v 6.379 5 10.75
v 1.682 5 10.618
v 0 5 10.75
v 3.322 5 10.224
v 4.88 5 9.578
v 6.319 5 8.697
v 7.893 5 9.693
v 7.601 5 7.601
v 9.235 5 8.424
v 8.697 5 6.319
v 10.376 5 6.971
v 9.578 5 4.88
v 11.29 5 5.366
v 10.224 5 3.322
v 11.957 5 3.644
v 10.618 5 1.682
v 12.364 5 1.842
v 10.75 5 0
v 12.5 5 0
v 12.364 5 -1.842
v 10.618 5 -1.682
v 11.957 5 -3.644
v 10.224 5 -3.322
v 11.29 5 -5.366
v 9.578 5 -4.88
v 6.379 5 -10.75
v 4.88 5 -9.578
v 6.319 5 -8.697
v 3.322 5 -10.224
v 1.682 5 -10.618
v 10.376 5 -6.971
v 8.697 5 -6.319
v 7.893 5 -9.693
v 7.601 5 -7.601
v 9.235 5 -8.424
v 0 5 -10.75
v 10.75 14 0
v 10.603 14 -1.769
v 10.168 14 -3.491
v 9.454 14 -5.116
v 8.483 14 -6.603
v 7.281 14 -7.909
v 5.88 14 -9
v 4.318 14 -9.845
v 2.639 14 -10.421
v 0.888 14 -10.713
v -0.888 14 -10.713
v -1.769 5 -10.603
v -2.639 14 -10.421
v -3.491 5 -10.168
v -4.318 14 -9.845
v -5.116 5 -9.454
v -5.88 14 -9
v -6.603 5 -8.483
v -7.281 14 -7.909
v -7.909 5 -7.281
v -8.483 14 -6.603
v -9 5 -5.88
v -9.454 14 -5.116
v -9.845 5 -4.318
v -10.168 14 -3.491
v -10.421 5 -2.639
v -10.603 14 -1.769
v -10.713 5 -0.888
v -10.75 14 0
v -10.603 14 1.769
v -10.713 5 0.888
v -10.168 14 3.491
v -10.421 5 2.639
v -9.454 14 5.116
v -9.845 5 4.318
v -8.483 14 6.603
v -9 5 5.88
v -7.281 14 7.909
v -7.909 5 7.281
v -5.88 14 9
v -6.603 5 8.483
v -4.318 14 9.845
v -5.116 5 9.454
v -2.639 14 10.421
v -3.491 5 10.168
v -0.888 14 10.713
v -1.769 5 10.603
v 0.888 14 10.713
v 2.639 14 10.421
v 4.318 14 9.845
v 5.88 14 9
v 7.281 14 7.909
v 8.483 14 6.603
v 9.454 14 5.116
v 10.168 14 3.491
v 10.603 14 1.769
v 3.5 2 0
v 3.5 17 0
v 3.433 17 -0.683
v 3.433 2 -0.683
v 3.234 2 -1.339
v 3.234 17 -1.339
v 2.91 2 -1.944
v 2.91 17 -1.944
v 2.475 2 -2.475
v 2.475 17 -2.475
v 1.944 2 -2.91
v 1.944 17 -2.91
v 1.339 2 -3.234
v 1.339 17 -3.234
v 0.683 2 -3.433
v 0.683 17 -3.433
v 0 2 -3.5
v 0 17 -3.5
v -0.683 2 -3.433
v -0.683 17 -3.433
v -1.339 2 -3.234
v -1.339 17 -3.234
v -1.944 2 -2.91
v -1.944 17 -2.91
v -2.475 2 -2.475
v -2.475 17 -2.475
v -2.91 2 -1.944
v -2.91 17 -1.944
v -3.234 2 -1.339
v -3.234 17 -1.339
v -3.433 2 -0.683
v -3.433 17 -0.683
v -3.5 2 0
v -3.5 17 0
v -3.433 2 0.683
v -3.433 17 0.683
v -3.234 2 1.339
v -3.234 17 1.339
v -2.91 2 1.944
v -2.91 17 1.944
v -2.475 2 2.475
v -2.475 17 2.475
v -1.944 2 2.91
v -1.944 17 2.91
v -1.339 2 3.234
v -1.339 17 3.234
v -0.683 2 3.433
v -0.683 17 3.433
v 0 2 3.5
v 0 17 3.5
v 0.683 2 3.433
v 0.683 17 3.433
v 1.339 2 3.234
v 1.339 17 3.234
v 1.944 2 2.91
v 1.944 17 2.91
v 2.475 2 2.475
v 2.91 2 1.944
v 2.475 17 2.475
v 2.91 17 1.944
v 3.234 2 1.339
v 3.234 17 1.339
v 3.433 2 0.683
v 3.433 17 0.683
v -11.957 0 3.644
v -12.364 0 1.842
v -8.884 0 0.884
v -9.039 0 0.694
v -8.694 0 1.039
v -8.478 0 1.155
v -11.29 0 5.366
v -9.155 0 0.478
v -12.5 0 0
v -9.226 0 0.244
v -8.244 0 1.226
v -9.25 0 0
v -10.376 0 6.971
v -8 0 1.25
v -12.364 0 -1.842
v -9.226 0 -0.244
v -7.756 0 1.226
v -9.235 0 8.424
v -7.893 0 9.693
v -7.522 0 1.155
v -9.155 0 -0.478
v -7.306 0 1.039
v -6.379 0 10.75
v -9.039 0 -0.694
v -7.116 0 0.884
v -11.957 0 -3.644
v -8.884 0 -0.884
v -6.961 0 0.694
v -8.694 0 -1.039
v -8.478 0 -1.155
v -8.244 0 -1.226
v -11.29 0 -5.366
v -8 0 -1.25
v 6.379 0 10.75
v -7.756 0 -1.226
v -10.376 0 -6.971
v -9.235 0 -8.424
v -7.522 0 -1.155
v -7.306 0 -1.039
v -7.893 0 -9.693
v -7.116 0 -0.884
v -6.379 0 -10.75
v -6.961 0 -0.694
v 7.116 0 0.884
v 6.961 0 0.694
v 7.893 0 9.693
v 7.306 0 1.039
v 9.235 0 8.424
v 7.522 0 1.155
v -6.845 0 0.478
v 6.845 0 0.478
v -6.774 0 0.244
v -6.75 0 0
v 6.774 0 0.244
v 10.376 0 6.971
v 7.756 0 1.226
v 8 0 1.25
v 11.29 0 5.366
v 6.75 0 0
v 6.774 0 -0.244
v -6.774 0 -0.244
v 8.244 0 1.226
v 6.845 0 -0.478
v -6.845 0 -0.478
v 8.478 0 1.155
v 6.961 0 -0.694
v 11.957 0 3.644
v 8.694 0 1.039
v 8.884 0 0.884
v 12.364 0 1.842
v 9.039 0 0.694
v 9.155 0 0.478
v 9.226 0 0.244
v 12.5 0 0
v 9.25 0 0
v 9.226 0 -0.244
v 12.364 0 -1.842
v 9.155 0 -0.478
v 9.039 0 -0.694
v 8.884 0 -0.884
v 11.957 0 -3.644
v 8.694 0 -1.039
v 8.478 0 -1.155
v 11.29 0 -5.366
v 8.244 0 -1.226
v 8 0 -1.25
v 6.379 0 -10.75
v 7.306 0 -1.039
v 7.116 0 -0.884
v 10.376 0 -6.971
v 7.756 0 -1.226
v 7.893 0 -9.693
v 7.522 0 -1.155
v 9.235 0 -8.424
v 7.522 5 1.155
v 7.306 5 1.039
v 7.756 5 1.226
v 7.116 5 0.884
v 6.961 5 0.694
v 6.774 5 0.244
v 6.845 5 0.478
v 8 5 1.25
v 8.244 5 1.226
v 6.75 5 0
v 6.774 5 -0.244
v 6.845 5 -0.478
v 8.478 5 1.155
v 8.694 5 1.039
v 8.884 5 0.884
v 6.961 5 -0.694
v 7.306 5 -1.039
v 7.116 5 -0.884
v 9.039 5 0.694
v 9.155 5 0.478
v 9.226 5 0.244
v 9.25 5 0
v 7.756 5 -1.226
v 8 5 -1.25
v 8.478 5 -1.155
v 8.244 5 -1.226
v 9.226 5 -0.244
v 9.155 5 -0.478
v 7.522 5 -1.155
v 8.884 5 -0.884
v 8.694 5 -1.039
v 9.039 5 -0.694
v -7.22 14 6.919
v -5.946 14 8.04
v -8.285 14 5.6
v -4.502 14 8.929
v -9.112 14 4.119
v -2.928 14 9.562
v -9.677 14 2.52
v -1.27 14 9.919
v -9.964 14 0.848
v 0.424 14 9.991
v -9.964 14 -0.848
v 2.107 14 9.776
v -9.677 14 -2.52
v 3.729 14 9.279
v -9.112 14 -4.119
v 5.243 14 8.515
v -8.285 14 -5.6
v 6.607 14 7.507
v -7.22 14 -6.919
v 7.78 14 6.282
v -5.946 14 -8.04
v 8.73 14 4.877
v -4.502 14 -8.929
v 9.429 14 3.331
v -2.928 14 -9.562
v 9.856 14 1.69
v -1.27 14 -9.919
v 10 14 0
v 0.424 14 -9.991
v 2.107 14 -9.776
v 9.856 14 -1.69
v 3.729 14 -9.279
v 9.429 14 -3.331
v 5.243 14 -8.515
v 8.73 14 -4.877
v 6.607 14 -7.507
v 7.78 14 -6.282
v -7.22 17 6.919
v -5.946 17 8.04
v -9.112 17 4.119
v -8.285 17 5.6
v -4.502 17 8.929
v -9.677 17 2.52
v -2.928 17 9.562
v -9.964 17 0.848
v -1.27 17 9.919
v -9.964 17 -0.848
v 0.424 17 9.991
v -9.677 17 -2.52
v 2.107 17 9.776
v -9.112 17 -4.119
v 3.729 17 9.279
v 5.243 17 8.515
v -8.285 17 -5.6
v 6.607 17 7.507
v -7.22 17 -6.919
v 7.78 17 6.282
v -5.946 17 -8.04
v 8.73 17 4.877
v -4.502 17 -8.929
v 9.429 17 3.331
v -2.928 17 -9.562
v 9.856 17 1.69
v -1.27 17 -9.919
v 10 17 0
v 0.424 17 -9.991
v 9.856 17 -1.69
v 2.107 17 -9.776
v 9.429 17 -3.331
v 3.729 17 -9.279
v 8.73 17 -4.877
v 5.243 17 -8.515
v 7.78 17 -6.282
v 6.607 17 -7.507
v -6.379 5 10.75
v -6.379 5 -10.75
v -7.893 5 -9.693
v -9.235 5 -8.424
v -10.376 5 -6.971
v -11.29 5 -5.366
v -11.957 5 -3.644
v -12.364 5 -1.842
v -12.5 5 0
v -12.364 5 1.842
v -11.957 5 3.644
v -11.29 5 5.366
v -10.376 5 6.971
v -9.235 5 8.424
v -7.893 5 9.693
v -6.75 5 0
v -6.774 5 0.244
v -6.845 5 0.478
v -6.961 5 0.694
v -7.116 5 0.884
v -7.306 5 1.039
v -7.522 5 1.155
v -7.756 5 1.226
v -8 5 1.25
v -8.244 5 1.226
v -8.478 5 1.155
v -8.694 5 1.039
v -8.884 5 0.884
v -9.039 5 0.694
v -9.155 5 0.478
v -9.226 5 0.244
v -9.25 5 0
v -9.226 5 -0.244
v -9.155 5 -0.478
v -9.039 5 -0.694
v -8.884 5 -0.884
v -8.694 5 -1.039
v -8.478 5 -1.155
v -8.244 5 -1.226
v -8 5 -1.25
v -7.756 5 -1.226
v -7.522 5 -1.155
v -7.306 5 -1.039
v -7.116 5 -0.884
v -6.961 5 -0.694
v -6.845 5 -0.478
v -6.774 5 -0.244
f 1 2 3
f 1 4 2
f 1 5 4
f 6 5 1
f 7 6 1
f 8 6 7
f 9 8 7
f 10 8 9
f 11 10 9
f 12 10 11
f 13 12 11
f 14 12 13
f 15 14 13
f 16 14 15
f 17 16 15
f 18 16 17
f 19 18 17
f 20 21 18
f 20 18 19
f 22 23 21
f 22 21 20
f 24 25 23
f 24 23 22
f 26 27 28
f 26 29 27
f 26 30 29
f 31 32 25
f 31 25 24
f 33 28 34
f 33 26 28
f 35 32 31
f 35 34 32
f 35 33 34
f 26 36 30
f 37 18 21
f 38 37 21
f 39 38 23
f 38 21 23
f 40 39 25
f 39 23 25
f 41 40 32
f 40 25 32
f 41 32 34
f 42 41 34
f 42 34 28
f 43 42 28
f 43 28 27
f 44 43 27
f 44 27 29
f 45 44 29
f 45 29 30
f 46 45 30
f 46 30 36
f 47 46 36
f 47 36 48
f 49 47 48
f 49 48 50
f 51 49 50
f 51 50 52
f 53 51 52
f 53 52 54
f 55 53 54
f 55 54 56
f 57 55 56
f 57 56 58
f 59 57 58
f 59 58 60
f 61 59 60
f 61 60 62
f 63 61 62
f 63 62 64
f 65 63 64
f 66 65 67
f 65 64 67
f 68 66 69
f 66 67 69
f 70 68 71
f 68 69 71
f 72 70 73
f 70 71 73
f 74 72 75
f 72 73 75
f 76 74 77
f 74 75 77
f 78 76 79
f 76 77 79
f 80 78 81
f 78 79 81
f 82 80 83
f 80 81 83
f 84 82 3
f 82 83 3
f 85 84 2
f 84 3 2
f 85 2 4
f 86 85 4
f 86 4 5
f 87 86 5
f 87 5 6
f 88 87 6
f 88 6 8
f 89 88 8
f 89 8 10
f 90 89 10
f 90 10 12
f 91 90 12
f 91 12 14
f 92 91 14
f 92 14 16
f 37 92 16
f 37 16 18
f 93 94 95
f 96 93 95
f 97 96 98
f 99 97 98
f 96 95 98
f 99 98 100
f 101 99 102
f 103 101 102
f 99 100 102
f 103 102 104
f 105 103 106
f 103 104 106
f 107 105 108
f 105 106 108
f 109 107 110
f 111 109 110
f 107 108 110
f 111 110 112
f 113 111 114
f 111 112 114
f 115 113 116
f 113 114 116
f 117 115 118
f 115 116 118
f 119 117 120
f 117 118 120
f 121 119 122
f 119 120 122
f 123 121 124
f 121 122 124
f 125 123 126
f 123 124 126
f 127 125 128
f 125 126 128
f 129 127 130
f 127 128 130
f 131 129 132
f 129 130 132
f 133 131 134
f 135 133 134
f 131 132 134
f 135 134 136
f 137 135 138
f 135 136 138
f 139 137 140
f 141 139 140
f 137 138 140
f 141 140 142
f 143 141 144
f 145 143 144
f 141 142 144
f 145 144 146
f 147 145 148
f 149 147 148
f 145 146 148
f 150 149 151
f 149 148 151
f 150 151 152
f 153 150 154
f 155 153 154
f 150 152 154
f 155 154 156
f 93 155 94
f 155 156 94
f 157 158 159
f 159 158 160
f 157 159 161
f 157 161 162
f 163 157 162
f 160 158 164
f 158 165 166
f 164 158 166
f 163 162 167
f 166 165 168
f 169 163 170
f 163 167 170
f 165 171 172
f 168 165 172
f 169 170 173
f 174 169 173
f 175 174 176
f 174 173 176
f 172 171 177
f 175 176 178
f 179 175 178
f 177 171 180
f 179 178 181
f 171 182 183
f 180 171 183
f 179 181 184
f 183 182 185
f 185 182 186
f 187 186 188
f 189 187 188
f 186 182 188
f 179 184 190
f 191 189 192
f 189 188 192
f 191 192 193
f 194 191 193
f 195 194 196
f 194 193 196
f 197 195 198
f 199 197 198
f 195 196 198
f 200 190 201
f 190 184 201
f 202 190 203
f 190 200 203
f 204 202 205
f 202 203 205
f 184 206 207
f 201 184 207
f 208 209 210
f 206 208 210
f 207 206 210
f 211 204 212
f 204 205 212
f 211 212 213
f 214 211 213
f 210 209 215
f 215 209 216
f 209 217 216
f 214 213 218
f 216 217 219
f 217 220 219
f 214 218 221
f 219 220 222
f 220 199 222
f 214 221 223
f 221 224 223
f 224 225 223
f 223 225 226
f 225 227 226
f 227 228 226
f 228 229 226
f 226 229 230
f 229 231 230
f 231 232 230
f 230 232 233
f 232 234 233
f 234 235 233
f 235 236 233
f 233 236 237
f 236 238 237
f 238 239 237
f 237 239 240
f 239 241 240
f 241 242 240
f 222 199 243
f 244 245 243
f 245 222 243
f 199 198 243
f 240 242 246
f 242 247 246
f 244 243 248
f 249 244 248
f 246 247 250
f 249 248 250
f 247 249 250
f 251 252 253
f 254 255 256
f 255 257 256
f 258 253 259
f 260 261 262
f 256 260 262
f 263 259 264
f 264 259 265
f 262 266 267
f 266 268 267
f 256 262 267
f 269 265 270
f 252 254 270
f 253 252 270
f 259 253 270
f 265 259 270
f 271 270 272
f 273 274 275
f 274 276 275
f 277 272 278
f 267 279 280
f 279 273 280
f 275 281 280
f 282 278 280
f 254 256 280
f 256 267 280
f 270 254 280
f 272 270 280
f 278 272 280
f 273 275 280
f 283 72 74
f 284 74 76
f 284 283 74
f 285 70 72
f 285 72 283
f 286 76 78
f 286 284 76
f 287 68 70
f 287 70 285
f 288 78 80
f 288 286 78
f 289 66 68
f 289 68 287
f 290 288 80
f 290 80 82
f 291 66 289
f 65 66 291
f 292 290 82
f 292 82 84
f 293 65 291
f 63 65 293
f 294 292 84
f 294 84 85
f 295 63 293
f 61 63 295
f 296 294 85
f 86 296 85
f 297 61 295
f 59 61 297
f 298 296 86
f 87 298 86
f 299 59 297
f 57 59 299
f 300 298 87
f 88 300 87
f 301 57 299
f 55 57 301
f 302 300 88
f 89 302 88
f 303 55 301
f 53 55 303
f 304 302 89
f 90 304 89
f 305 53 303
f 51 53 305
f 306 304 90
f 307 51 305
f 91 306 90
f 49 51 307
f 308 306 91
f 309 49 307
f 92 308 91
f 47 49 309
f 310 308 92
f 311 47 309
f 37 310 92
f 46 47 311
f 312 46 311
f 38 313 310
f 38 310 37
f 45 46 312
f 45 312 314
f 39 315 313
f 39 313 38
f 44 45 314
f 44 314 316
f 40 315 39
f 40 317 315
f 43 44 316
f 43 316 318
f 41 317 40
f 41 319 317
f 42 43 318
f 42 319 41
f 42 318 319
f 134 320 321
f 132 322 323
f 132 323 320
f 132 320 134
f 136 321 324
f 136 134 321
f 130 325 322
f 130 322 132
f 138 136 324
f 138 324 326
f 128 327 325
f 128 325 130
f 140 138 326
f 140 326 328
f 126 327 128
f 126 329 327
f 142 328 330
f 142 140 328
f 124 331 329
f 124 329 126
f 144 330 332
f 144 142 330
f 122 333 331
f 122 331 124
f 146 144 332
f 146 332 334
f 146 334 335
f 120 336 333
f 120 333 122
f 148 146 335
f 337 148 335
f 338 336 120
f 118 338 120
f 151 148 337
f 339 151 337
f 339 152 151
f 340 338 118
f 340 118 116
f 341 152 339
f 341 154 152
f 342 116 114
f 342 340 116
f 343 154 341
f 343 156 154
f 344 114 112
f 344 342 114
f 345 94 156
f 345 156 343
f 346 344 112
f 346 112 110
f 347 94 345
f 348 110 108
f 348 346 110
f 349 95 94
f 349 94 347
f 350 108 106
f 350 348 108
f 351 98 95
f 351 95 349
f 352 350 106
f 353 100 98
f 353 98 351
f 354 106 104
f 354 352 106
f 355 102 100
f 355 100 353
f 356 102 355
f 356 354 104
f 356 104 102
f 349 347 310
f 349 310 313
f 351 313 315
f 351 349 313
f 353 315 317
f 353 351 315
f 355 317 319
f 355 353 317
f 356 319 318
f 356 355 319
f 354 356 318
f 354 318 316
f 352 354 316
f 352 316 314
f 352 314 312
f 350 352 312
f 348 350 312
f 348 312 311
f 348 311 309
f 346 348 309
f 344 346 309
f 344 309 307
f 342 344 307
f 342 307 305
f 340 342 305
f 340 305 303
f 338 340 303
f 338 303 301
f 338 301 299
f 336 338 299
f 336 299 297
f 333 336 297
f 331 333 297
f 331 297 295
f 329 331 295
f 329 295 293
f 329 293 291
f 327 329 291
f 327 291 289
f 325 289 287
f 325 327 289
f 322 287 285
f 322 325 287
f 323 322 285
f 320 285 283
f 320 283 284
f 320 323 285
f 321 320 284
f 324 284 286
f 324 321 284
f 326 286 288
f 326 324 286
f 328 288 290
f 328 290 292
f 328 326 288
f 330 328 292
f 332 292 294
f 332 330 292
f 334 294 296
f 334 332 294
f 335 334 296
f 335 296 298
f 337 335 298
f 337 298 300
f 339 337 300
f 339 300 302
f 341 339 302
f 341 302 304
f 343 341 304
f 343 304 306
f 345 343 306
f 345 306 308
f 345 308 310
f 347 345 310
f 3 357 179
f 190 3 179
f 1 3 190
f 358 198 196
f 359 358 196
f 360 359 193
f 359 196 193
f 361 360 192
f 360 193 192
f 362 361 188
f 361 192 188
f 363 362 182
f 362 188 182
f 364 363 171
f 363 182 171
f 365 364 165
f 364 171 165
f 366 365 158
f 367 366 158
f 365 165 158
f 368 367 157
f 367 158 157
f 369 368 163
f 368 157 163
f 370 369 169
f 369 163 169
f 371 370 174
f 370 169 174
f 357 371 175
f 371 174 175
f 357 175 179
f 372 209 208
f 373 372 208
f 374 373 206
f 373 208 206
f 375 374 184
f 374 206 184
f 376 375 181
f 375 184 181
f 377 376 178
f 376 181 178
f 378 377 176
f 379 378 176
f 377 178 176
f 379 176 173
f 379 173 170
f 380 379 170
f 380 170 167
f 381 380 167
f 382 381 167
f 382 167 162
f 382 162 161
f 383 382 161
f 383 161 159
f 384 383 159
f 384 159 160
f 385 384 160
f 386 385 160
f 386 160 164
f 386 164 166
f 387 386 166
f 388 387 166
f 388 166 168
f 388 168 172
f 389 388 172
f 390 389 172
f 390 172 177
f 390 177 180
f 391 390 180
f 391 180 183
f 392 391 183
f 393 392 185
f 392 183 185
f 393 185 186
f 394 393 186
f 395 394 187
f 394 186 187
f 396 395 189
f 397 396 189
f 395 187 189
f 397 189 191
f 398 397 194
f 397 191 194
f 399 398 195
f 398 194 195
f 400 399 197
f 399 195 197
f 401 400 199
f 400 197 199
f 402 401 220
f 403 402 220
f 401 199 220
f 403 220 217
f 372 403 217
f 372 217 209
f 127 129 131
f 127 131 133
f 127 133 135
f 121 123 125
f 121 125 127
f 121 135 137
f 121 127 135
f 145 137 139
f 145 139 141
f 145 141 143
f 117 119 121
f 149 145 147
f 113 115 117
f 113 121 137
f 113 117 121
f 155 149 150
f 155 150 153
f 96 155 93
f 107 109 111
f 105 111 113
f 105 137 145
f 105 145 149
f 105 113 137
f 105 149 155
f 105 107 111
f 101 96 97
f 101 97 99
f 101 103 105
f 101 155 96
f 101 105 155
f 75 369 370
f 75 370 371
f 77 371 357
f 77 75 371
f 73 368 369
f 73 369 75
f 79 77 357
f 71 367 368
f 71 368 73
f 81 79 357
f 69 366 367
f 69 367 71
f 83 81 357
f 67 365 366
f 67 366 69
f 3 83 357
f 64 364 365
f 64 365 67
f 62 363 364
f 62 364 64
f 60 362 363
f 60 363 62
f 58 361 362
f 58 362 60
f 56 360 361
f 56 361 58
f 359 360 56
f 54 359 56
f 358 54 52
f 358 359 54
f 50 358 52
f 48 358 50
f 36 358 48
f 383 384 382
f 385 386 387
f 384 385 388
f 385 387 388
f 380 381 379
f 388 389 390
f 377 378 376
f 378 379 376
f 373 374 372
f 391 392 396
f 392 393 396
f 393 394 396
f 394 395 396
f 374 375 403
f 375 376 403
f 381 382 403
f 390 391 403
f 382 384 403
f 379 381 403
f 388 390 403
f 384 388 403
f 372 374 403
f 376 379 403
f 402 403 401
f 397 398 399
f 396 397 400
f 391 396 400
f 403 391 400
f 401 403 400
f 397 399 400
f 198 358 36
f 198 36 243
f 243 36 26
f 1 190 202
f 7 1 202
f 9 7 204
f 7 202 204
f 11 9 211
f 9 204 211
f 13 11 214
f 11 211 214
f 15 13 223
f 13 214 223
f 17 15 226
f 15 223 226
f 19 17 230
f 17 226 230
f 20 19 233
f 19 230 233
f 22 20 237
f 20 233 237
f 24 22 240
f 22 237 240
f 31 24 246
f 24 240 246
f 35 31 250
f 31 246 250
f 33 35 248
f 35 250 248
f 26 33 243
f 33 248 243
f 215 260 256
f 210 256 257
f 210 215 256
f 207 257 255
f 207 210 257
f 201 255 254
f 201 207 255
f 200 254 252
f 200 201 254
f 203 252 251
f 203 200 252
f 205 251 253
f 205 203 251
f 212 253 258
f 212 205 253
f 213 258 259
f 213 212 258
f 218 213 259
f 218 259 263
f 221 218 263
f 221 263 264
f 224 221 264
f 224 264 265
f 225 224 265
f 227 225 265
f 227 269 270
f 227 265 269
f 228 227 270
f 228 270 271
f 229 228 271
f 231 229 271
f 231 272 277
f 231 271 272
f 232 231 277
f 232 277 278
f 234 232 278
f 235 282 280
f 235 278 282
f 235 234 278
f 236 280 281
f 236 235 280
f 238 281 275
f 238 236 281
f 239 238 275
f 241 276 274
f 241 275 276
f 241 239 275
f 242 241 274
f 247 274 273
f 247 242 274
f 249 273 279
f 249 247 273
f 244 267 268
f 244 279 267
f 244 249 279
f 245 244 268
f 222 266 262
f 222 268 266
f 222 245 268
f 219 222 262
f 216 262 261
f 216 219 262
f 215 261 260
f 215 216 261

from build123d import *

# Parameters (mm, degrees)
SKETCH1_R           = 12.5
BOSS_EXTRUDE1_DEPTH = 17
SKETCH2_R           = 3.5
CUT_EXTRUDE1_DEPTH  = 15
SKETCH4_OUTSIDE_W   = 34.846
SKETCH4_OUTSIDE_H   = 34.846
SKETCH4_OUTSIDE_R   = 10
CUT_EXTRUDE3_DEPTH  = 12
SKETCH5_R           = 1.25
CUT_EXTRUDE4_DEPTH  = 10
SKETCH8_R           = 10.75
SKETCH8_R_2         = 4
BOSS_EXTRUDE3_DEPTH = 9
SKETCH7_W           = 22.925756412
SKETCH7_H           = 4.884412095
CUT_EXTRUDE6_DEPTH  = 6


with BuildPart() as part:
    # Sketch1 → Boss-Extrude1 (new body)
    with BuildSketch(Plane(origin=(0, 0, 0), x_dir=(1, 0, 0), z_dir=(0, 1, 0))):
        Circle(SKETCH1_R)
    extrude(amount=BOSS_EXTRUDE1_DEPTH)

    # Sketch2 → Cut-Extrude1 (cut)
    with BuildSketch(Plane(origin=(0, 17, 0), x_dir=(1, 0, 0), z_dir=(0, 1, 0))):
        Circle(SKETCH2_R)
    extrude(amount=-CUT_EXTRUDE1_DEPTH, mode=Mode.SUBTRACT)

    # Sketch4 outside → Cut-Extrude3 (cut)
    with BuildSketch(Plane(origin=(0, 17, 0), x_dir=(1, 0, 0), z_dir=(0, 1, 0))):
        Rectangle(SKETCH4_OUTSIDE_W, SKETCH4_OUTSIDE_H)
        Circle(SKETCH4_OUTSIDE_R, mode=Mode.SUBTRACT)
    extrude(amount=-CUT_EXTRUDE3_DEPTH, mode=Mode.SUBTRACT)

    # Sketch5 → Cut-Extrude4 (cut)
    with BuildSketch(Plane.XZ):
        with Locations((-8, 0)):
            Circle(SKETCH5_R)
    cut_extrude4 = extrude(amount=-CUT_EXTRUDE4_DEPTH, mode=Mode.SUBTRACT)

    # Mirror2: Cut-Extrude4 across plane
    add(cut_extrude4.mirror(Plane(origin=(0, 0, 0), x_dir=(0, 0, 1), z_dir=(1, 0, 0))), mode=Mode.SUBTRACT)

    # Sketch8 → Boss-Extrude3 (add)
    with BuildSketch(Plane(origin=(0, 5, 0), x_dir=(1, 0, 0), z_dir=(0, 1, 0))):
        Circle(SKETCH8_R)
        Circle(SKETCH8_R_2, mode=Mode.SUBTRACT)
    extrude(amount=BOSS_EXTRUDE3_DEPTH)

    # Sketch7 → Cut-Extrude6 (cut, through all)
    with BuildSketch(Plane(origin=(0, 5, 0), x_dir=(1, 0, 0), z_dir=(0, 1, 0))):
        with Locations((0.376120232, 13.192206048)):
            Rectangle(SKETCH7_W, SKETCH7_H)
    cut_extrude6 = extrude(amount=-CUT_EXTRUDE6_DEPTH, mode=Mode.SUBTRACT)

    # Mirror3: Cut-Extrude6 across plane
    add(cut_extrude6.mirror(Plane.XY), mode=Mode.SUBTRACT)


solid = part.part
